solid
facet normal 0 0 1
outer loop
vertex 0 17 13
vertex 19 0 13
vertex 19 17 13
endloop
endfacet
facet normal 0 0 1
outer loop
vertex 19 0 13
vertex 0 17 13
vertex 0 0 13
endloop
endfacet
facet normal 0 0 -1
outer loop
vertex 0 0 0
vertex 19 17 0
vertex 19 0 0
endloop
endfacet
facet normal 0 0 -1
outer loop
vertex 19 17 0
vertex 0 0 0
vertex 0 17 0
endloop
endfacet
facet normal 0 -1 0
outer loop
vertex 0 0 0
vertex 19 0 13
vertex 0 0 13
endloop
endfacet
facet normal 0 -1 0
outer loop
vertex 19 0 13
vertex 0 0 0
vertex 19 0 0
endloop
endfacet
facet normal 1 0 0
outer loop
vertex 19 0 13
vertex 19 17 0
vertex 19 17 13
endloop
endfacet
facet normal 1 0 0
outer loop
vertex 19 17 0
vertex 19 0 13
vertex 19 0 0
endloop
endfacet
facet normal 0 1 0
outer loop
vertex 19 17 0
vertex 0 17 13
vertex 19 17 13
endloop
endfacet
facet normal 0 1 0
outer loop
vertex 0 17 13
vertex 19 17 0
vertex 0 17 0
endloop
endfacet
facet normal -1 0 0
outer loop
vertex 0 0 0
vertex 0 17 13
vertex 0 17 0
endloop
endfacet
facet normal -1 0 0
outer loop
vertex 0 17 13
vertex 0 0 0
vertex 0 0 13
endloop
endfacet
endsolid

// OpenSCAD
// Generated by SolidPython 1.0.1 on 2020-07-29 00:46:56


cube(size = [19, 17, 13]);
/***********************************************
*********      SolidPython code:      **********
************************************************
 
# import packages: SolidPython
from solid import *
from solid.utils import *
from itertools import chain, combinations, permutations


class Resize:

    def __init__(self, scad_file):
        self.scad_file = scad_file
        #self.scad_file = import_scad(scad_file)
        # cone/cylinder param:
        self.r1 = 0
        self.r2 = 0
        self.h = 0
        # rectangular prism param:
        self.w = 0
        self.l = 0
        # ellipse param:
        self.r = 0

    # import OpenScad code (file name corresponds to shape)


    # classify shape + parameters
    def assign(self, param1, param2, param3):
        if self.scad_file == 'cone.scad':
            self.r1 = param1
            self.r2 = param2
            self.h = param3
        elif self.scad_file == 'cylinder.scad':
            self.r1 = param1
            self.r2 = param2
            self.h = param3
        elif self.scad_file == 'rectangularPrism.scad':
            self.h = param1
            self.l = param2
            self.w = param3
        else:
            self.r = param1
            self.h = param2

    # resize parameters
    def iterate(self):
        x = range(3, 20, 2)
        i = 1
        if self.scad_file == 'cone.scad':
            tempList = list(permutations(x, 2))
            for temp in tempList:
                param1 = temp[0]
                param2 = temp[1]
                filepath = 'produced_scad_files/' + 'cone' + str(param1) + '_' + str(param2) + '_' + '.scad'
                scad_render_to_file(cylinder(h=param1, r1=param2, r2=0), filepath)

        elif self.scad_file == 'cylinder.scad':
            tempList = list(permutations(x, 3))
            for temp in tempList:
                param1 = temp[0]
                param2 = temp[1]
                filepath = 'produced_scad_files/' + 'cylinder' + str(param1) + '_' + str(param2) + '_' + '.scad'
                scad_render_to_file(cylinder(h=param1, r1=param2, r2=param2), filepath)

        elif self.scad_file == 'rectangularPrism.scad':
            tempList = list(permutations(x, 3))
            for temp in tempList:
                param1 = temp[0]
                param2 = temp[1]
                param3 = temp[2]
                filepath = 'produced_scad_files/' + 'rectangularPrism' + str(param1) + '_' + str(param2) + '_' + str(
                    param3) + '.scad'
                scad_render_to_file(cube(size=(param1, param2, param3)), filepath)

        elif self.scad_file == 'ellipse.scad':
            tempList = list(permutations(x, 4))
            for temp in tempList:
                param1 = temp[0]
                param2 = temp[1]
                param3 = temp[2]
                param4 = temp[3]
                filepath = 'produced_scad_files/' + 'ellipse' + str(param1) + '_' + str(param2) + '_' + str(param3) + '_' + str(param4) + '.scad'
                scad_render_to_file(scale([param1, param2, param3])(sphere(r=param4)), filepath)

    def render_to_scadfile(self):
        scad_render_to_file(scad, 'example.scad') 
 
************************************************/
